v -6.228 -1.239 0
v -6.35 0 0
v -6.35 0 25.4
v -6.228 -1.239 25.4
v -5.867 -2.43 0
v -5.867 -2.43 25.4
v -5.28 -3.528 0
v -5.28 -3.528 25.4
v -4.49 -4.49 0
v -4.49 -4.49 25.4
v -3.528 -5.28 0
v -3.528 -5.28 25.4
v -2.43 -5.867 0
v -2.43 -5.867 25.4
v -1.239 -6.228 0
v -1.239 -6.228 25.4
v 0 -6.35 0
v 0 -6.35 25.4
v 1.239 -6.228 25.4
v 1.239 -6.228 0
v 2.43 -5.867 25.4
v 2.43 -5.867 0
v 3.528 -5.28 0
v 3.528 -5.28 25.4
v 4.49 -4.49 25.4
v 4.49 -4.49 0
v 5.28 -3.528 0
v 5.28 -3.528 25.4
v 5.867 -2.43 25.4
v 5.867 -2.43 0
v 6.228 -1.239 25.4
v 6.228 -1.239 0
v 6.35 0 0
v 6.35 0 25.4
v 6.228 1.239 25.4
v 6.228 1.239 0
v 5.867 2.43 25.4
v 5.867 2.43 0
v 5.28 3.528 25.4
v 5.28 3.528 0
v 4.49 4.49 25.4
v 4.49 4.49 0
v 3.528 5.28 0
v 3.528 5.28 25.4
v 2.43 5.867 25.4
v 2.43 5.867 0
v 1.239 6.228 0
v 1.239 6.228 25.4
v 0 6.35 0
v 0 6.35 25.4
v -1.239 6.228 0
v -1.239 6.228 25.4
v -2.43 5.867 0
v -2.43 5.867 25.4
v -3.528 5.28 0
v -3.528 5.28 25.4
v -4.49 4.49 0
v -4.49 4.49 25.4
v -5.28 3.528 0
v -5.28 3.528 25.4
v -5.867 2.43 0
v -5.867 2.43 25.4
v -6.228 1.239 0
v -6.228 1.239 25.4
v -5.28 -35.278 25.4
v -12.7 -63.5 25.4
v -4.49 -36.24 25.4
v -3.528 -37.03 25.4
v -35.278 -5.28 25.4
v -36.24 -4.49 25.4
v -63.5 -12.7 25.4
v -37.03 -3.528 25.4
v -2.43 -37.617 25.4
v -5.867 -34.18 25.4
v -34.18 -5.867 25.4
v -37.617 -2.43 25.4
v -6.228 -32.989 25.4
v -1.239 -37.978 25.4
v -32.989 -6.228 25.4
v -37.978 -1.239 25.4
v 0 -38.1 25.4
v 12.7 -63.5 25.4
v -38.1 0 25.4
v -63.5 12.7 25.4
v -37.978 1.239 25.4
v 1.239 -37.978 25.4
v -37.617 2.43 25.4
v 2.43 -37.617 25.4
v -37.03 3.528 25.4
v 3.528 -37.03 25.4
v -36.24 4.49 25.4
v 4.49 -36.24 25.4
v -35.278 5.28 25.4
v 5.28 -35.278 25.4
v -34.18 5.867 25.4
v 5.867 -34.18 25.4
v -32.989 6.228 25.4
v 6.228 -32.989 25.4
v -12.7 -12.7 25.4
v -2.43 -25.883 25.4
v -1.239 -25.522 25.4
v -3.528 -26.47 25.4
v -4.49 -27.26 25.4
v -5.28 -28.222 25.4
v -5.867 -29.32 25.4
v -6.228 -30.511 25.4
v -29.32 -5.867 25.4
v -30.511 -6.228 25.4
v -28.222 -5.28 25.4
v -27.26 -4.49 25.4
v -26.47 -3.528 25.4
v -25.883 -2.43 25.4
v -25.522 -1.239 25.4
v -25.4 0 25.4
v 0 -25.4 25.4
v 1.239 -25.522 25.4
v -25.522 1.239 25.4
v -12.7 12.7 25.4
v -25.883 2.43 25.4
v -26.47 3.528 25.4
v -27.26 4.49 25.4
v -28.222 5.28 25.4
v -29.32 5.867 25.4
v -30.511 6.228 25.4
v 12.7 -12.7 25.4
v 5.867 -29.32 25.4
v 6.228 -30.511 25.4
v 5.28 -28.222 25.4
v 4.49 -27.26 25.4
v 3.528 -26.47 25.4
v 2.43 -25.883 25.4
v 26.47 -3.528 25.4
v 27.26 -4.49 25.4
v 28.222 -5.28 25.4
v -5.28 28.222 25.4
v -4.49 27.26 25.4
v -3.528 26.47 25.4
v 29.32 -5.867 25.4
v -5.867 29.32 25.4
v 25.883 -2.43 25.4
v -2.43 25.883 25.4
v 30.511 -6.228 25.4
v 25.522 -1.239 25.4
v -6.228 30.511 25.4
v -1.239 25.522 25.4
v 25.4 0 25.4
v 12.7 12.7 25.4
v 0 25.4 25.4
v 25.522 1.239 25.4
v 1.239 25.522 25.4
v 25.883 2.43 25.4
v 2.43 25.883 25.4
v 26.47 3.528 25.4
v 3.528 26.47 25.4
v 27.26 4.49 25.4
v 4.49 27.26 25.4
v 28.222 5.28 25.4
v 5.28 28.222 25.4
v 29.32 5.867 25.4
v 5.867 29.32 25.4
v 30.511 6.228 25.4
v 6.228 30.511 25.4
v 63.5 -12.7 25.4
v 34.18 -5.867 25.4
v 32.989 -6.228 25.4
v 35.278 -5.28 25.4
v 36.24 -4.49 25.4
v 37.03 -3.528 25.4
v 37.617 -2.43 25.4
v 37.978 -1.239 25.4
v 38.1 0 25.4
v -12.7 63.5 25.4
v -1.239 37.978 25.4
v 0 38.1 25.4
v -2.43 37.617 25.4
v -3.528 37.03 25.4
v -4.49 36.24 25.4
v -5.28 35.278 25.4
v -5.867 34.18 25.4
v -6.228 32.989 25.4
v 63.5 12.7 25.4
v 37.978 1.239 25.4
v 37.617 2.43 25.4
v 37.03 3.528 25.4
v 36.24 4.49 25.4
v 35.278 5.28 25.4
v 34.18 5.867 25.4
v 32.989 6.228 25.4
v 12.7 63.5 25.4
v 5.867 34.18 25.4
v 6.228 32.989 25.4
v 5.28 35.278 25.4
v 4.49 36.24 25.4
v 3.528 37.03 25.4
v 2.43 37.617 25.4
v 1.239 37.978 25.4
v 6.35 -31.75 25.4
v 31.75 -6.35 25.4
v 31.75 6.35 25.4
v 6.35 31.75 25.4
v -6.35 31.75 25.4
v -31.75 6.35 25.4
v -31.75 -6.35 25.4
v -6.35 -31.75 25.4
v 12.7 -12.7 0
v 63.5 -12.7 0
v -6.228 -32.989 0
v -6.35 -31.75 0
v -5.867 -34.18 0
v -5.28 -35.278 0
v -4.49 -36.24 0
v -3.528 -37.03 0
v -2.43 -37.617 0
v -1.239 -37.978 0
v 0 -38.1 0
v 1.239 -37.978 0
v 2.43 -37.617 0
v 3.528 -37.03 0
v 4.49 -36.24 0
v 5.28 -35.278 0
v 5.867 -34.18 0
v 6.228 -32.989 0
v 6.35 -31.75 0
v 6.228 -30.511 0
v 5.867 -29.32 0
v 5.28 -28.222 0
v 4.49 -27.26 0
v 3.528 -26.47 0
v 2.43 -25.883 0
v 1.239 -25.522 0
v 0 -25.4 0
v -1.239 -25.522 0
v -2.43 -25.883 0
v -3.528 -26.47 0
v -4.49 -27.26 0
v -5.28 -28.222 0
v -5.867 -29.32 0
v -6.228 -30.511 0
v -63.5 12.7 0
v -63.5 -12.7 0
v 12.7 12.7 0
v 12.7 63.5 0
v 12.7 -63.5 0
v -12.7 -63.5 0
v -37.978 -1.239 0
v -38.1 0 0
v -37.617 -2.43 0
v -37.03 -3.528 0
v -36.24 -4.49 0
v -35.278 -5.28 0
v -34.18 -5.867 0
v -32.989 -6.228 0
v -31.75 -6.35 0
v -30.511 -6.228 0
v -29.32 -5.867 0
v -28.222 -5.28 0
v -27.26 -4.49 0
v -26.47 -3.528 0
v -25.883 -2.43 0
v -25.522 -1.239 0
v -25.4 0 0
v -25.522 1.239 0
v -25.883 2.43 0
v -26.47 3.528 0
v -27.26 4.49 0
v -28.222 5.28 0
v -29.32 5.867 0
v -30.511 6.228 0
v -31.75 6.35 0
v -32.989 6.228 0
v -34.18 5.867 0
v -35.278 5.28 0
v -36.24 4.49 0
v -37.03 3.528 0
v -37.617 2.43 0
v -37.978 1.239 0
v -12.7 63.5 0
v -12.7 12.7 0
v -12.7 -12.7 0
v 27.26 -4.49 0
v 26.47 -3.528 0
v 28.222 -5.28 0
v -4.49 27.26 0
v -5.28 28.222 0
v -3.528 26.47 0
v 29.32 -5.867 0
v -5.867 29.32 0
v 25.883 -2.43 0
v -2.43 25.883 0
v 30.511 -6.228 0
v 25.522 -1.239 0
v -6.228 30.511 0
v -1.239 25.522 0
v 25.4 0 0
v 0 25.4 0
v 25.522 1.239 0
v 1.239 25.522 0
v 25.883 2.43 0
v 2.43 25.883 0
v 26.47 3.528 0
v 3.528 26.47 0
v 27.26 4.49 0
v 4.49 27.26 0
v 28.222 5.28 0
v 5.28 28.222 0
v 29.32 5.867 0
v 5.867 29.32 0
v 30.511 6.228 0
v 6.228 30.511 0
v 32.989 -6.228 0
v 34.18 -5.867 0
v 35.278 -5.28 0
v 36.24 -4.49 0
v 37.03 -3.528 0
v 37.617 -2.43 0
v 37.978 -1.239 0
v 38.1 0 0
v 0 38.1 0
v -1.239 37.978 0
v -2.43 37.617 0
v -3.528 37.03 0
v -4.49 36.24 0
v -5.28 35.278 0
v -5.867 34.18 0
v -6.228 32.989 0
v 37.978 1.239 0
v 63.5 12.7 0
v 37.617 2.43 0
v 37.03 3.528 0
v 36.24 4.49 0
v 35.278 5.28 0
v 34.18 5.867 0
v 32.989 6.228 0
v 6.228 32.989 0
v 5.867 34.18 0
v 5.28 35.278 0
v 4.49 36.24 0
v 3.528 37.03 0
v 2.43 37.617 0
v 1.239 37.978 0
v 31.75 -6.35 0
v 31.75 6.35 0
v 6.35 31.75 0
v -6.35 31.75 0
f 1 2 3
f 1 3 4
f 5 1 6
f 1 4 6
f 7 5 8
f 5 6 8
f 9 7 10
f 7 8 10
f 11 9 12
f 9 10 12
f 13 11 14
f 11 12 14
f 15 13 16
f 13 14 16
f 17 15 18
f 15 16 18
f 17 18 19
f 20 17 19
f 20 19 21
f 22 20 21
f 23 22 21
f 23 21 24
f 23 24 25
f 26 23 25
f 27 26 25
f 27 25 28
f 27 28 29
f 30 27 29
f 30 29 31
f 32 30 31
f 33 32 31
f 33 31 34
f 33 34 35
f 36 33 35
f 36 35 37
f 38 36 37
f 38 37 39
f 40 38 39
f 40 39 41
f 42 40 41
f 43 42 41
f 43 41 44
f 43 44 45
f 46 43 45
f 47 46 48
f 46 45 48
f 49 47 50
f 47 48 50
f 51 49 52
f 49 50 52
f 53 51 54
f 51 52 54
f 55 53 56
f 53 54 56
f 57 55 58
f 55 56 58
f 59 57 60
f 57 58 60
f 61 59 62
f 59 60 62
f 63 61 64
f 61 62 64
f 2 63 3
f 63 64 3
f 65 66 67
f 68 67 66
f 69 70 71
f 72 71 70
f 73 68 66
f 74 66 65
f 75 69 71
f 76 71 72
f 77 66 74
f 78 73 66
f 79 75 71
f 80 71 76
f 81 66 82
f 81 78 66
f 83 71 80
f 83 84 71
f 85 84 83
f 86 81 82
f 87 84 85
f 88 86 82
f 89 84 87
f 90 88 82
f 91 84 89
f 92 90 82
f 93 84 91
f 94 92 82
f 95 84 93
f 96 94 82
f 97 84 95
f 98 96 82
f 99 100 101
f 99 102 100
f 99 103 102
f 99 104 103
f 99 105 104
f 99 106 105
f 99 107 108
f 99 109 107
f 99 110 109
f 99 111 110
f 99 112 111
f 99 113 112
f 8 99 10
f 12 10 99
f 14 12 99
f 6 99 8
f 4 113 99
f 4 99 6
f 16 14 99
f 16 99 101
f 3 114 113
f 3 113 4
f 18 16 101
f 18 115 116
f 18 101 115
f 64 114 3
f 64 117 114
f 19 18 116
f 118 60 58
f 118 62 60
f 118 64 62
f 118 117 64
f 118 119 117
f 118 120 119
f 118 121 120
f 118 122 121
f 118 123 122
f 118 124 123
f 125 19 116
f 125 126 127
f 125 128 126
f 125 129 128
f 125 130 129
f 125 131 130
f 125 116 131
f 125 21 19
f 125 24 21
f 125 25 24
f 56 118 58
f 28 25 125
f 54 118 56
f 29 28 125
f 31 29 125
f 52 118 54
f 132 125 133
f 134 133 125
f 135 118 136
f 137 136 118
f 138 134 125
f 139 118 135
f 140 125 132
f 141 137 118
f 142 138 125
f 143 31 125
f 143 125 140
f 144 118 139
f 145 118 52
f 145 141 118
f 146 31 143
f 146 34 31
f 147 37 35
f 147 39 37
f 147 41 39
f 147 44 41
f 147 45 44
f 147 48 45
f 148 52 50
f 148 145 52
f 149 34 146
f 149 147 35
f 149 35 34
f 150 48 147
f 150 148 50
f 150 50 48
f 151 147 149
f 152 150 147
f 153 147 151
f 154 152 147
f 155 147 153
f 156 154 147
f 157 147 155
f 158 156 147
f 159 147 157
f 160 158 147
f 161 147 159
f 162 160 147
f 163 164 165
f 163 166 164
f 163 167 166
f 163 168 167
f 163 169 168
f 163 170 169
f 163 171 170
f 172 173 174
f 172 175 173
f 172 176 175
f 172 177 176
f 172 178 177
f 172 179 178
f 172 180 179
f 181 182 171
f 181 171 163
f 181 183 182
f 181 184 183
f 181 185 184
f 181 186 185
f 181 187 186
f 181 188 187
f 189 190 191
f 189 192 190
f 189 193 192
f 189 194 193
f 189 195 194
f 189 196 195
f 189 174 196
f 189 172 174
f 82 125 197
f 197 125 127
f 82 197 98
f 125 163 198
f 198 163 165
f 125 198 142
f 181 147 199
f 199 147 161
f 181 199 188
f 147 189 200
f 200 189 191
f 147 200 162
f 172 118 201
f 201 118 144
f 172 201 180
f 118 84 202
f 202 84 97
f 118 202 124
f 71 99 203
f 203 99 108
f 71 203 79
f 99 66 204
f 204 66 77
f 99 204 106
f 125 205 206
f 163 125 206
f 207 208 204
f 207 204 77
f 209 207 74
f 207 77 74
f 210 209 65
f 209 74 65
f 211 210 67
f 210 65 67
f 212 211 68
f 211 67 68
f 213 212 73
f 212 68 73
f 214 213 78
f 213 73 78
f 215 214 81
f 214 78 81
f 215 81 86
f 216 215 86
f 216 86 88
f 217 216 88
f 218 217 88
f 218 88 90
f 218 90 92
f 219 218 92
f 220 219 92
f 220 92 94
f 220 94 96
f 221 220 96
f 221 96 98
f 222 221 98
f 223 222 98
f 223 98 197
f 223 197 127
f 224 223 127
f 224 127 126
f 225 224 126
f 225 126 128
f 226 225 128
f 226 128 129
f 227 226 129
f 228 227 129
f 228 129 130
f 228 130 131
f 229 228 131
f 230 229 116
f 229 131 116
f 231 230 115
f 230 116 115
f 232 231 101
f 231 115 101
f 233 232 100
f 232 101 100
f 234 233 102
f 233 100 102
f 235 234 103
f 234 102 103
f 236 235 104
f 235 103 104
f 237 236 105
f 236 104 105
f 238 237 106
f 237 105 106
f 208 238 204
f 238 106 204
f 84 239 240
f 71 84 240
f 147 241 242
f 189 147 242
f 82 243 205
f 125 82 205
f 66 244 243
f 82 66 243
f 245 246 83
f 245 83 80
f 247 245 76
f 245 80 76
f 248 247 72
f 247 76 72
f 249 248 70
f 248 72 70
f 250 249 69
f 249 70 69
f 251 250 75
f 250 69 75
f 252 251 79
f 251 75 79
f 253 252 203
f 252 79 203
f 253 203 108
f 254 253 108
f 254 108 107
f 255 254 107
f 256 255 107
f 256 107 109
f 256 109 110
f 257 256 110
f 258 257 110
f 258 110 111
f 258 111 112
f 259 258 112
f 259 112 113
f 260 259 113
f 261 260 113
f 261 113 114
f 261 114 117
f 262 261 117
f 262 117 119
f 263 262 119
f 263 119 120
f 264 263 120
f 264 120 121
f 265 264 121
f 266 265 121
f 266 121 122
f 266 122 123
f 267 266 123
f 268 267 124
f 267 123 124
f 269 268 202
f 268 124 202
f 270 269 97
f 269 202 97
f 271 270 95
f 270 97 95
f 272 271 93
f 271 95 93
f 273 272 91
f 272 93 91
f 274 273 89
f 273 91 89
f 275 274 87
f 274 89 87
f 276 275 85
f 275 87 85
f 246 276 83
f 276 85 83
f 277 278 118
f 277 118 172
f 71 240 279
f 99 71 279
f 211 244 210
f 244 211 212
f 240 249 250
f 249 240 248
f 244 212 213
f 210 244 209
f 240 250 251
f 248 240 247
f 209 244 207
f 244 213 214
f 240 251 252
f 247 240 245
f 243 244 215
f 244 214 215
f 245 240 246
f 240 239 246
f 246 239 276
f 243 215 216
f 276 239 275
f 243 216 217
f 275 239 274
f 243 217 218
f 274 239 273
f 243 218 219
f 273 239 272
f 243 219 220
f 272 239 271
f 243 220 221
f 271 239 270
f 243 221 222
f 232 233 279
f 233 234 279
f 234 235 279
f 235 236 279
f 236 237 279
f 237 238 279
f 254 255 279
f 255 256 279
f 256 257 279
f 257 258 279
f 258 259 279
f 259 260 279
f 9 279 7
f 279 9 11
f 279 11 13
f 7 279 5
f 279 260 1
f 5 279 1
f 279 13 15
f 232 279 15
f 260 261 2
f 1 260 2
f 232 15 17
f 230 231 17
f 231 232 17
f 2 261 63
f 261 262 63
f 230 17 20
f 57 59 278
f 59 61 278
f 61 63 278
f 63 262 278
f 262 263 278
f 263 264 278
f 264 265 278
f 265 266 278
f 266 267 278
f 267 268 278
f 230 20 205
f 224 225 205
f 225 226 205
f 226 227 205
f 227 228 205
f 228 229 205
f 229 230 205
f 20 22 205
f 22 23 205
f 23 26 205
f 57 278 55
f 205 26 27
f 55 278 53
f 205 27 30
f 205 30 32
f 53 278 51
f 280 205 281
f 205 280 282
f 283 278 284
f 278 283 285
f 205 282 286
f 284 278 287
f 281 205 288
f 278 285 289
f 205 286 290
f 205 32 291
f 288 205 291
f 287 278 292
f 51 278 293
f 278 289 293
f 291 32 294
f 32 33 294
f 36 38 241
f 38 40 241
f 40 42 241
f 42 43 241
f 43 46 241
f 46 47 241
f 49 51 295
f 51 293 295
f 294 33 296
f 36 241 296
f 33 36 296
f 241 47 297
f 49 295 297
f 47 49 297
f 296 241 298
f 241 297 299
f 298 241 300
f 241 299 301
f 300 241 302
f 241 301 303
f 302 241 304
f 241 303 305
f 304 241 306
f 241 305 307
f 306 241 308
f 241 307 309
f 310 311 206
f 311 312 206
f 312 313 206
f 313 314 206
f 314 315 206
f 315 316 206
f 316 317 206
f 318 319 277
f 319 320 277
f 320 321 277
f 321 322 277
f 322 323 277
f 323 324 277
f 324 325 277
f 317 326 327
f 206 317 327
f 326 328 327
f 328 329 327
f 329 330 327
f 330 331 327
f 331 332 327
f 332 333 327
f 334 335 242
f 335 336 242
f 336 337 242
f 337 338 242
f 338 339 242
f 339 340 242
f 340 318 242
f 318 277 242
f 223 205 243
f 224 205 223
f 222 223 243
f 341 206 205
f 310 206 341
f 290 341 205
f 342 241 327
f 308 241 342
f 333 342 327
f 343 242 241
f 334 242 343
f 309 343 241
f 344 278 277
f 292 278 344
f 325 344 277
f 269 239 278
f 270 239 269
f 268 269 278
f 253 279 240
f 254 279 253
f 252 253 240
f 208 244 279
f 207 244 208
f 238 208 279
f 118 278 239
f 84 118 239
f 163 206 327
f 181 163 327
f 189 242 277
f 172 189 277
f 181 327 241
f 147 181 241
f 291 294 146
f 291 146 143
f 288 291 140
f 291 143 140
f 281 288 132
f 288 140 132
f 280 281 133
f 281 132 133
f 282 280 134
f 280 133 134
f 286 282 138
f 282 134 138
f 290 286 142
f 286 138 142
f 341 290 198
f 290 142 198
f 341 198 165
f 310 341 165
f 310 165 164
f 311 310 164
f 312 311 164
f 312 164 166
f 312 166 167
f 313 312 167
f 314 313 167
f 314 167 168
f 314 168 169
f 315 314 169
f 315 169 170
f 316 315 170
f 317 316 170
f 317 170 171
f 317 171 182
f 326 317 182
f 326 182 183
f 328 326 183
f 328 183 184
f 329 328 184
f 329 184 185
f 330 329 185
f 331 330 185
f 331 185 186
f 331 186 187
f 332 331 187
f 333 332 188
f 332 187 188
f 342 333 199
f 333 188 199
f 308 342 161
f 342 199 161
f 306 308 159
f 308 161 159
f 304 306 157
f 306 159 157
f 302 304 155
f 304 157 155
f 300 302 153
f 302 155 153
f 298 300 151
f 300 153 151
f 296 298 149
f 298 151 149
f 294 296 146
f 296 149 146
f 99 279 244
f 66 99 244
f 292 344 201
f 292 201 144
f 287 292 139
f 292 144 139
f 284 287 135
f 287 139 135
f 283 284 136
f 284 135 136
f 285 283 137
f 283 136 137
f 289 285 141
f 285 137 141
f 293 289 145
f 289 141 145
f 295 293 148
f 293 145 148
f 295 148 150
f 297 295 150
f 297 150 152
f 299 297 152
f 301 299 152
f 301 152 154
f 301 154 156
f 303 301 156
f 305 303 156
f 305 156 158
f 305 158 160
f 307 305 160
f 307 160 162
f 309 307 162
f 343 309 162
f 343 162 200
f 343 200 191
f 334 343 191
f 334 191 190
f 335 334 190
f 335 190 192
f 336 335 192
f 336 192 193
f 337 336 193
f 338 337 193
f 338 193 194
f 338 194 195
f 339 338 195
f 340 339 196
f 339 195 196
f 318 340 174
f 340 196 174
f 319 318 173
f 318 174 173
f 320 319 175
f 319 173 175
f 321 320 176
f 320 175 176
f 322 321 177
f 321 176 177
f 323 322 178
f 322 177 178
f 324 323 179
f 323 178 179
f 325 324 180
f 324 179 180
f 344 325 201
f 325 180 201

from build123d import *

# Parameters (mm, degrees)
F0_W     = 50.8
F0_H     = 12.7
F0_W_2   = 12.7
F0_H_2   = 50.8
F1_DEPTH = 25.4
F2_D     = 12.7


with BuildPart() as f1:
    # F0 (on Top) → F1 (new body)
    with BuildSketch(Plane.XY):
        with Locations((38.1, -6.35)):
            Rectangle(F0_W, F0_H)
        with Locations((6.35, -38.1)):
            Rectangle(F0_W_2, F0_H_2)
        with Locations((6.35, -6.35)):
            Rectangle(F0_W_2, F0_H)
        with Locations((38.1, 6.35)):
            Rectangle(F0_W, F0_H)
        with Locations((-6.35, -38.1)):
            Rectangle(F0_W_2, F0_H_2)
        with Locations((-6.35, -6.35)):
            Rectangle(F0_W_2, F0_H)
        with Locations((6.35, 6.35)):
            Rectangle(F0_W_2, F0_H)
        with Locations((-38.1, -6.35)):
            Rectangle(F0_W, F0_H)
        with Locations((-6.35, 6.35)):
            Rectangle(F0_W_2, F0_H)
        with Locations((6.35, 38.1)):
            Rectangle(F0_W_2, F0_H_2)
        with Locations((-38.1, 6.35)):
            Rectangle(F0_W, F0_H)
        with Locations((-6.35, 38.1)):
            Rectangle(F0_W_2, F0_H_2)
    extrude(amount=F1_DEPTH)

    # F2 (through all)
    with Locations(Plane(origin=(0, 0, 0), x_dir=(1, 0, 0), z_dir=(0, 0, -1))):
        with Locations((31.75, 0), (0, -31.75), (-31.75, 0), (0, 0), (0, 31.75)):
            Hole(F2_D / 2)


solid = f1.part
